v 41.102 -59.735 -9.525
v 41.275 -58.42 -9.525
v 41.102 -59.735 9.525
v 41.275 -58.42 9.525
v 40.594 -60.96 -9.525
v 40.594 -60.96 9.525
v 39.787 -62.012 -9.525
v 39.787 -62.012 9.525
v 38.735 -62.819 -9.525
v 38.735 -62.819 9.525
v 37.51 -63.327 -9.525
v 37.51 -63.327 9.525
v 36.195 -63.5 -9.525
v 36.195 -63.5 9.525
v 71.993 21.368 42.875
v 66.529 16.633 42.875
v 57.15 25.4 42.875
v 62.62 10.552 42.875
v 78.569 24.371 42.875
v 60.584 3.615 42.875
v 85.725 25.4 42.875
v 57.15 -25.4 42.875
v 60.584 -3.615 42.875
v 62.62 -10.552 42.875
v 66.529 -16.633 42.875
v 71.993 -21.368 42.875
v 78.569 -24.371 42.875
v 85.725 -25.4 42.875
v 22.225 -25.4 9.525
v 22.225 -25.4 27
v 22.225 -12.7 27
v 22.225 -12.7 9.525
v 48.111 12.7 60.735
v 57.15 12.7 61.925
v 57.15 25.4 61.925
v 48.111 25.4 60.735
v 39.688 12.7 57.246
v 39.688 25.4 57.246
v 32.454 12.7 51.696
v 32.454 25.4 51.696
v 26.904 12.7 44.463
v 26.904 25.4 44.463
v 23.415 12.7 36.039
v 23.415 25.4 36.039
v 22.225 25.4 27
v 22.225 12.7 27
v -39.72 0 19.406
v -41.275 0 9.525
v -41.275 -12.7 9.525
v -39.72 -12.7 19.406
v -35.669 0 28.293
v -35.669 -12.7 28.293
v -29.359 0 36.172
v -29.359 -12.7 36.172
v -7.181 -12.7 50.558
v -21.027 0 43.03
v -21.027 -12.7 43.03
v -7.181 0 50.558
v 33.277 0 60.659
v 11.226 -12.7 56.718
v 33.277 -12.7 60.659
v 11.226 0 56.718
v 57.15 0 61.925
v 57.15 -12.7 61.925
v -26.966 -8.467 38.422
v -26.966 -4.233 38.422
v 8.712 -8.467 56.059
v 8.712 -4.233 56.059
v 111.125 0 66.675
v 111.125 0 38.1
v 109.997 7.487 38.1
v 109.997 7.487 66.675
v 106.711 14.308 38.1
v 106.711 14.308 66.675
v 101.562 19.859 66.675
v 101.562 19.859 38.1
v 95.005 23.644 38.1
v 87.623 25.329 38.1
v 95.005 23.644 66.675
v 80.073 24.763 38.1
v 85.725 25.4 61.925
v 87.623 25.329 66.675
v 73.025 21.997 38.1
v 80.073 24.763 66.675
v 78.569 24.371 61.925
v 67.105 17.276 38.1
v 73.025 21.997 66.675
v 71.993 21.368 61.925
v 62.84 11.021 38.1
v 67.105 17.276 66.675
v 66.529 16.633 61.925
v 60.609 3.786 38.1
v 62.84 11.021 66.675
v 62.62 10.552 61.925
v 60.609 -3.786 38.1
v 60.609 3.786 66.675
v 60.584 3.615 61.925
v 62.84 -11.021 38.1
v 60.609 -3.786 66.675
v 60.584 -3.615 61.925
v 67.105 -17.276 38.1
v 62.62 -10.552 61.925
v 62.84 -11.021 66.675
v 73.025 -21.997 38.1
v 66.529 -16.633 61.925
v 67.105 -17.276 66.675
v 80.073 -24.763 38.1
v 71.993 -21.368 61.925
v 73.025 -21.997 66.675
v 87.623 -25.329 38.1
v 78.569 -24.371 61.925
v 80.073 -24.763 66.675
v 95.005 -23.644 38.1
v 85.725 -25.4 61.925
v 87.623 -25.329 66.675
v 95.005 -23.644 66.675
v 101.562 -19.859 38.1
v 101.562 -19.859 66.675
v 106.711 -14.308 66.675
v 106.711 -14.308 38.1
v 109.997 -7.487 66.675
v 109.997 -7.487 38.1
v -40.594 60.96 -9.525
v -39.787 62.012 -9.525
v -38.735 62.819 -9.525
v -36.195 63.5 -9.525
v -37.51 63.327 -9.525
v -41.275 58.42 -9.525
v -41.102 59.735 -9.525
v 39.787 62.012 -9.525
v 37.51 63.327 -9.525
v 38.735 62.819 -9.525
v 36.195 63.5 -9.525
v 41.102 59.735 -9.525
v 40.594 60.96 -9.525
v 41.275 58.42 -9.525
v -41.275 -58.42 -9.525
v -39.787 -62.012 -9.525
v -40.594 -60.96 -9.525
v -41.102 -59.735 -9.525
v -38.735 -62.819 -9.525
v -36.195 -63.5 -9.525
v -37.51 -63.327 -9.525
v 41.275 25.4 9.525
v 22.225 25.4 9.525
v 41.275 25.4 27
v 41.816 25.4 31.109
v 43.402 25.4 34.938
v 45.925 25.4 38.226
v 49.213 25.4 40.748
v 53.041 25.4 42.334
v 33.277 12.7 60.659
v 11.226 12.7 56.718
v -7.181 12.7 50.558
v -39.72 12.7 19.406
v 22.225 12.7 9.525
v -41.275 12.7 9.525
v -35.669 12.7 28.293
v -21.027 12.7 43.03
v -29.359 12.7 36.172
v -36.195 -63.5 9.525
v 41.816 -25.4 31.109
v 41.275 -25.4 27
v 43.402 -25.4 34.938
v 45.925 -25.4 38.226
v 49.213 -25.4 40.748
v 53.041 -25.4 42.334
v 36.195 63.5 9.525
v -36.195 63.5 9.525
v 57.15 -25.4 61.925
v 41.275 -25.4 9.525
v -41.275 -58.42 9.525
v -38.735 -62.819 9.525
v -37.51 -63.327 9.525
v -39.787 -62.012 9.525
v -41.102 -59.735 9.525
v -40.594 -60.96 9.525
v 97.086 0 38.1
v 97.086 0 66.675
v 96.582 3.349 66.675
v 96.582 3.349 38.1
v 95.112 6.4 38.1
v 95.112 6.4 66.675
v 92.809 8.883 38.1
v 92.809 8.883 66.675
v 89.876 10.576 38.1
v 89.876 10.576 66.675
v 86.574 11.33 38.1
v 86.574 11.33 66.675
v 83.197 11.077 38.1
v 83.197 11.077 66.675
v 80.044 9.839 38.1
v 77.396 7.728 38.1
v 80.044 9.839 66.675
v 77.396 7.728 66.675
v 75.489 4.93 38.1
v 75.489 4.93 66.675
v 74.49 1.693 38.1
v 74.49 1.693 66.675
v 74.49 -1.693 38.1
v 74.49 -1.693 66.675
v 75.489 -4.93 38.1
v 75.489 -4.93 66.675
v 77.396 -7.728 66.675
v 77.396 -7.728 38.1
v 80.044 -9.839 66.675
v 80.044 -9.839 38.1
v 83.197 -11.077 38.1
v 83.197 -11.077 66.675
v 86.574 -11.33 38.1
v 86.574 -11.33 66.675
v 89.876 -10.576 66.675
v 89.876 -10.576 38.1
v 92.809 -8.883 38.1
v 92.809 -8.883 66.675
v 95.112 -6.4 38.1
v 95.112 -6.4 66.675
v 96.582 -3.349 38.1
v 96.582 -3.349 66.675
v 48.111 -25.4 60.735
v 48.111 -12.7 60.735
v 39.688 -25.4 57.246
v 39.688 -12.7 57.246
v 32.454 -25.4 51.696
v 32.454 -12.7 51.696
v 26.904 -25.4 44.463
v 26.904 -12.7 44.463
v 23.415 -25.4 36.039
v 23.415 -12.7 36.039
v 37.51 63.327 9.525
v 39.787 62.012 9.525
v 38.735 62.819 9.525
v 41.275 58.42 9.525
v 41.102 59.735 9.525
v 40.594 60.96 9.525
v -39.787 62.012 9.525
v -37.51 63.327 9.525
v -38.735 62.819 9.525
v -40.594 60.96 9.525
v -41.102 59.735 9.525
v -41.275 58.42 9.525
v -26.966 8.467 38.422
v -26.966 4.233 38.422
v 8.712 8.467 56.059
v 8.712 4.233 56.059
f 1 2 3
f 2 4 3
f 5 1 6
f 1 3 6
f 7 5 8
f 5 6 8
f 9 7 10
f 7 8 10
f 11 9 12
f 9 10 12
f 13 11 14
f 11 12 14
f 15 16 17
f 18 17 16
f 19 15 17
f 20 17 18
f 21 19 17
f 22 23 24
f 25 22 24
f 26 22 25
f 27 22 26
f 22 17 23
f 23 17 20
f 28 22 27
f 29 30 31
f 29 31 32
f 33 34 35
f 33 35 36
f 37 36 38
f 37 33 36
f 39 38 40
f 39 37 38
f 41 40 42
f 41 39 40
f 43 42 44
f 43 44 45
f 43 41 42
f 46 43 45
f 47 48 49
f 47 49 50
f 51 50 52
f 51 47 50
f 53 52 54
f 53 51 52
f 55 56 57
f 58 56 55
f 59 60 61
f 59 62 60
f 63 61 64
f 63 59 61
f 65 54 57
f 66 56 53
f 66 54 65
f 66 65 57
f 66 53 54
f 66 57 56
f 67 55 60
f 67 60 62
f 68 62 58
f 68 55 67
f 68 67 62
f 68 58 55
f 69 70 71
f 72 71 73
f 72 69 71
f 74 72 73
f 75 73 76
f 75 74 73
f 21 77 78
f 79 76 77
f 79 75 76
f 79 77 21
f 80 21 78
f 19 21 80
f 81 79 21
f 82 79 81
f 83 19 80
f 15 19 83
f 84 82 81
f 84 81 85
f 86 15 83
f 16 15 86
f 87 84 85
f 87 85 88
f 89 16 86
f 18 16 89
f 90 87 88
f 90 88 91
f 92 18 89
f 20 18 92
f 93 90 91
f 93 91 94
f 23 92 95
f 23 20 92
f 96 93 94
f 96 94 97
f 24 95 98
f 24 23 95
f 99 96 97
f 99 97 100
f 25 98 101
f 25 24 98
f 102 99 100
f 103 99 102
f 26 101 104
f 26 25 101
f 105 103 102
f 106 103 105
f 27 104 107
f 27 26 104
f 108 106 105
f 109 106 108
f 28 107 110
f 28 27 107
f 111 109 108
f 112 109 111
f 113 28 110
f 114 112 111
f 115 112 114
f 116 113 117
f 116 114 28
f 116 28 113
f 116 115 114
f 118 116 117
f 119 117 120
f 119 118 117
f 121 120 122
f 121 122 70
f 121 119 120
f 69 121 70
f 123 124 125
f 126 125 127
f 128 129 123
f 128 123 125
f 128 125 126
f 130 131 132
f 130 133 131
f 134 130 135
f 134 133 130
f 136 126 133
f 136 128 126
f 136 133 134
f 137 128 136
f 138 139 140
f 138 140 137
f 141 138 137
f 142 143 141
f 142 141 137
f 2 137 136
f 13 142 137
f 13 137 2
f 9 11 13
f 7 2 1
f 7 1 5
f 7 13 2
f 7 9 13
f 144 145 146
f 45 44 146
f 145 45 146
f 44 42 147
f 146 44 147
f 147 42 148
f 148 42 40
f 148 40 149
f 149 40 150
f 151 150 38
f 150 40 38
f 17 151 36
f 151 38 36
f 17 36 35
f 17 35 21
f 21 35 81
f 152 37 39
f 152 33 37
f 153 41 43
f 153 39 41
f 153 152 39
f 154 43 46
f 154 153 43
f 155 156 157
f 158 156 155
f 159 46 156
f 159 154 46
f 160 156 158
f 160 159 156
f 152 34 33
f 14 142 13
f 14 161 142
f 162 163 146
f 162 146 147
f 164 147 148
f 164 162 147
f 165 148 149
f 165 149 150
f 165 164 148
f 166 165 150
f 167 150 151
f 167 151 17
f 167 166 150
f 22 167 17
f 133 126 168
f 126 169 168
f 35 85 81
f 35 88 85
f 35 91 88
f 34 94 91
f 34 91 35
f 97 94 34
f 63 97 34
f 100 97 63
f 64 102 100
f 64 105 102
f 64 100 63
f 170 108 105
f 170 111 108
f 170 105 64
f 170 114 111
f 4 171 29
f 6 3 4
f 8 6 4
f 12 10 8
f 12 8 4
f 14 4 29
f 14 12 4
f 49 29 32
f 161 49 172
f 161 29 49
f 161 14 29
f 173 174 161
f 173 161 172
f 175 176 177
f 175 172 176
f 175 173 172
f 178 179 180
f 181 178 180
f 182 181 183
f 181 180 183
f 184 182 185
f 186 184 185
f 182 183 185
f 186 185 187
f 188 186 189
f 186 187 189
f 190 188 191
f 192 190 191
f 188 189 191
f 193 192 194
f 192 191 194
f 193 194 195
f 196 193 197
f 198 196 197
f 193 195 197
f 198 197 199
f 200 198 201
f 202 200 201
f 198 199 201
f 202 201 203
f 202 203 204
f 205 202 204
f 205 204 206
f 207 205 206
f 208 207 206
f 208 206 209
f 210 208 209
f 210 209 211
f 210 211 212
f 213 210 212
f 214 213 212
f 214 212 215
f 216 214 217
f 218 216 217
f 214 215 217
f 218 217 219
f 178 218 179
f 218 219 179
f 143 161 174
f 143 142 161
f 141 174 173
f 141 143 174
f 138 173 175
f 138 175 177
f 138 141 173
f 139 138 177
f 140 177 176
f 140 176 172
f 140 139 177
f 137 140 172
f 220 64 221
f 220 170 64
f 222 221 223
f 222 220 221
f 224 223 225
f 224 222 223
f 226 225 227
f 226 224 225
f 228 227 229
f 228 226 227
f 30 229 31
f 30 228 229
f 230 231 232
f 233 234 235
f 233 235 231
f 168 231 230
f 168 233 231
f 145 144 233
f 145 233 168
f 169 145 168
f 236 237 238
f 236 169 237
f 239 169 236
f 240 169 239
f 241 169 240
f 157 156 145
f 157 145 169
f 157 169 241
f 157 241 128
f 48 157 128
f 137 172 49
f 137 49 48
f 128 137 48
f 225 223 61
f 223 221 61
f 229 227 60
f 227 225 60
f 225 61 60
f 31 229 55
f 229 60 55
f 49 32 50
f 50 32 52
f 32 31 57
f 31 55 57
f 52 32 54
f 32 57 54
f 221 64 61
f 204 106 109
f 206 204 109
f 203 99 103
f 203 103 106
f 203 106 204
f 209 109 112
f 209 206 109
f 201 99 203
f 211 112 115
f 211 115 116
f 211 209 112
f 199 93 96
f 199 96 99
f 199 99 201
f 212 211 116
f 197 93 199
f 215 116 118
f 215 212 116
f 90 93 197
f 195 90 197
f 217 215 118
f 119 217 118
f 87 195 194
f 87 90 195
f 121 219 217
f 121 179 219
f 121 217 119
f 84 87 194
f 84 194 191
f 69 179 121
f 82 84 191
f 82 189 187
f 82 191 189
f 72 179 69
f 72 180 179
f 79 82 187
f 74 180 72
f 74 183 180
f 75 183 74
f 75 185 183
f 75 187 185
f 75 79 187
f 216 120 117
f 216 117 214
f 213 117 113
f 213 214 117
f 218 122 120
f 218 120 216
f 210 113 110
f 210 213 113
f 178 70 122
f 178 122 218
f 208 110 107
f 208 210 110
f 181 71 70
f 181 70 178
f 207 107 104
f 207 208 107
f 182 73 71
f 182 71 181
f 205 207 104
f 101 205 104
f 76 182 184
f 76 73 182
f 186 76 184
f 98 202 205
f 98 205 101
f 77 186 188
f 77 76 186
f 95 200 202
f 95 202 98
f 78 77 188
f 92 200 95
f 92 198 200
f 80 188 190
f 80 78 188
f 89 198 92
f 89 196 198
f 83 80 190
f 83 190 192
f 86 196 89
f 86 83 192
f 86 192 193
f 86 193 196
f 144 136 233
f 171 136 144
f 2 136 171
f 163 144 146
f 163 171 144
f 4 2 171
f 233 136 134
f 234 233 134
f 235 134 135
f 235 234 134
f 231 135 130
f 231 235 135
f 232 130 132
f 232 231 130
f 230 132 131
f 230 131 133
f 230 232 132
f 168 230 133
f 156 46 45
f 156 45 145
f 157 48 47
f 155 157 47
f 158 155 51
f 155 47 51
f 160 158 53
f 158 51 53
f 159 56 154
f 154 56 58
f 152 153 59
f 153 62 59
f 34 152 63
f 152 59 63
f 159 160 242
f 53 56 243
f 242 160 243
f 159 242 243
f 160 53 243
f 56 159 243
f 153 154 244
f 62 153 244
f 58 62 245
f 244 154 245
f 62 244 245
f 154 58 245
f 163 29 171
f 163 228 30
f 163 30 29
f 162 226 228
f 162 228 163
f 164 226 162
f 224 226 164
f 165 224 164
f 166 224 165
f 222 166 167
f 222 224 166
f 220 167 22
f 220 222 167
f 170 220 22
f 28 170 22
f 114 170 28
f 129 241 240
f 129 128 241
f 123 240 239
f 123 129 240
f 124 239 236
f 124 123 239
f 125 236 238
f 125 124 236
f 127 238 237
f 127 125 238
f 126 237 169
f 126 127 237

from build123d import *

# Parameters (mm, degrees)
F1_DEPTH = 63.5
F0_W     = 25.4
F0_H     = 19.05
F2_DEPTH = 25.4
F3_DEPTH = 12.7
F5_R     = 5.08
F6_R     = 11.3614366128
F7_DEPTH = 28.575


with BuildPart() as f1:
    # F0 (on Front) → F1 (new body, symmetric)
    with BuildSketch(Plane.XZ):
        Polygon((-41.275, -9.525), (41.275, -9.525), (41.275, 9.525), (22.225, 9.525), (-41.275, 9.525), align=None)
    extrude(amount=F1_DEPTH, both=True)

    # F0 (on Front) → F2 (join, symmetric)
    with BuildSketch(Plane.XZ):
        with BuildLine():
            Line((22.225, 9.525), (41.275, 9.525))
            Line((41.275, 9.525), (41.275, 27.0002))
            ThreePointArc((41.275, 27.0002), (45.9246798487, 38.2255201513), (57.15, 42.8752))
            Line((57.15, 42.8752), (60.325, 42.8752))
            Line((60.325, 42.8752), (60.325, 61.9252))
            Line((60.325, 61.9252), (57.15, 61.9252))
            ThreePointArc((57.15, 61.9252), (32.4542956671, 51.6959043329), (22.225, 27.0002))
            Line((22.225, 27.0002), (22.225, 9.525))
        make_face()
        with Locations((73.025, 52.4002)):
            Rectangle(F0_W, F0_H)
    extrude(amount=F2_DEPTH, both=True)

    # F0 (on Front) → F3 (join, symmetric)
    with BuildSketch(Plane.XZ):
        with BuildLine():
            add(Edge.make_bspline(
                [(-41.275, 9.525), (-40.521685034, 43.8802801073), (5.2034435794, 62.1158964932), (57.15, 61.9252)],
                knots=[0, 0, 0, 0, 111.5045361635, 111.5045361635, 111.5045361635, 111.5045361635], degree=3))
            Line((-41.275, 9.525), (22.225, 9.525))
            Line((22.225, 9.525), (22.225, 27.0002))
            ThreePointArc((22.225, 27.0002), (32.4542956671, 51.6959043329), (57.15, 61.9252))
        make_face()
    extrude(amount=F3_DEPTH, both=True)

    # F0 (on Front) → F4 (revolve)
    with BuildSketch(Plane.XZ):
        Polygon((85.725, 66.675), (85.725, 61.9252), (85.725, 42.8752), (85.725, 38.1), (111.125, 38.1), (111.125, 66.675), align=None)
    revolve(axis=Axis((85.725, 0, 52.3875), (0, 0, 1)))

    # F5
    f5_edges = [f1.edges().sort_by_distance(p)[0] for p in [
        (41.275, -63.5, 0),
        (-41.275, -63.5, 0),
        (-41.275, 63.5, 0),
        (41.275, 63.5, 0),
    ]]
    fillet(f5_edges, radius=F5_R)

    # F6 (on face) → F7 (cut)
    with BuildSketch(Plane.XY.offset(66.675)):
        with Locations((85.725, 0)):
            Circle(F6_R)
    extrude(amount=-F7_DEPTH, mode=Mode.SUBTRACT)


solid = f1.part
